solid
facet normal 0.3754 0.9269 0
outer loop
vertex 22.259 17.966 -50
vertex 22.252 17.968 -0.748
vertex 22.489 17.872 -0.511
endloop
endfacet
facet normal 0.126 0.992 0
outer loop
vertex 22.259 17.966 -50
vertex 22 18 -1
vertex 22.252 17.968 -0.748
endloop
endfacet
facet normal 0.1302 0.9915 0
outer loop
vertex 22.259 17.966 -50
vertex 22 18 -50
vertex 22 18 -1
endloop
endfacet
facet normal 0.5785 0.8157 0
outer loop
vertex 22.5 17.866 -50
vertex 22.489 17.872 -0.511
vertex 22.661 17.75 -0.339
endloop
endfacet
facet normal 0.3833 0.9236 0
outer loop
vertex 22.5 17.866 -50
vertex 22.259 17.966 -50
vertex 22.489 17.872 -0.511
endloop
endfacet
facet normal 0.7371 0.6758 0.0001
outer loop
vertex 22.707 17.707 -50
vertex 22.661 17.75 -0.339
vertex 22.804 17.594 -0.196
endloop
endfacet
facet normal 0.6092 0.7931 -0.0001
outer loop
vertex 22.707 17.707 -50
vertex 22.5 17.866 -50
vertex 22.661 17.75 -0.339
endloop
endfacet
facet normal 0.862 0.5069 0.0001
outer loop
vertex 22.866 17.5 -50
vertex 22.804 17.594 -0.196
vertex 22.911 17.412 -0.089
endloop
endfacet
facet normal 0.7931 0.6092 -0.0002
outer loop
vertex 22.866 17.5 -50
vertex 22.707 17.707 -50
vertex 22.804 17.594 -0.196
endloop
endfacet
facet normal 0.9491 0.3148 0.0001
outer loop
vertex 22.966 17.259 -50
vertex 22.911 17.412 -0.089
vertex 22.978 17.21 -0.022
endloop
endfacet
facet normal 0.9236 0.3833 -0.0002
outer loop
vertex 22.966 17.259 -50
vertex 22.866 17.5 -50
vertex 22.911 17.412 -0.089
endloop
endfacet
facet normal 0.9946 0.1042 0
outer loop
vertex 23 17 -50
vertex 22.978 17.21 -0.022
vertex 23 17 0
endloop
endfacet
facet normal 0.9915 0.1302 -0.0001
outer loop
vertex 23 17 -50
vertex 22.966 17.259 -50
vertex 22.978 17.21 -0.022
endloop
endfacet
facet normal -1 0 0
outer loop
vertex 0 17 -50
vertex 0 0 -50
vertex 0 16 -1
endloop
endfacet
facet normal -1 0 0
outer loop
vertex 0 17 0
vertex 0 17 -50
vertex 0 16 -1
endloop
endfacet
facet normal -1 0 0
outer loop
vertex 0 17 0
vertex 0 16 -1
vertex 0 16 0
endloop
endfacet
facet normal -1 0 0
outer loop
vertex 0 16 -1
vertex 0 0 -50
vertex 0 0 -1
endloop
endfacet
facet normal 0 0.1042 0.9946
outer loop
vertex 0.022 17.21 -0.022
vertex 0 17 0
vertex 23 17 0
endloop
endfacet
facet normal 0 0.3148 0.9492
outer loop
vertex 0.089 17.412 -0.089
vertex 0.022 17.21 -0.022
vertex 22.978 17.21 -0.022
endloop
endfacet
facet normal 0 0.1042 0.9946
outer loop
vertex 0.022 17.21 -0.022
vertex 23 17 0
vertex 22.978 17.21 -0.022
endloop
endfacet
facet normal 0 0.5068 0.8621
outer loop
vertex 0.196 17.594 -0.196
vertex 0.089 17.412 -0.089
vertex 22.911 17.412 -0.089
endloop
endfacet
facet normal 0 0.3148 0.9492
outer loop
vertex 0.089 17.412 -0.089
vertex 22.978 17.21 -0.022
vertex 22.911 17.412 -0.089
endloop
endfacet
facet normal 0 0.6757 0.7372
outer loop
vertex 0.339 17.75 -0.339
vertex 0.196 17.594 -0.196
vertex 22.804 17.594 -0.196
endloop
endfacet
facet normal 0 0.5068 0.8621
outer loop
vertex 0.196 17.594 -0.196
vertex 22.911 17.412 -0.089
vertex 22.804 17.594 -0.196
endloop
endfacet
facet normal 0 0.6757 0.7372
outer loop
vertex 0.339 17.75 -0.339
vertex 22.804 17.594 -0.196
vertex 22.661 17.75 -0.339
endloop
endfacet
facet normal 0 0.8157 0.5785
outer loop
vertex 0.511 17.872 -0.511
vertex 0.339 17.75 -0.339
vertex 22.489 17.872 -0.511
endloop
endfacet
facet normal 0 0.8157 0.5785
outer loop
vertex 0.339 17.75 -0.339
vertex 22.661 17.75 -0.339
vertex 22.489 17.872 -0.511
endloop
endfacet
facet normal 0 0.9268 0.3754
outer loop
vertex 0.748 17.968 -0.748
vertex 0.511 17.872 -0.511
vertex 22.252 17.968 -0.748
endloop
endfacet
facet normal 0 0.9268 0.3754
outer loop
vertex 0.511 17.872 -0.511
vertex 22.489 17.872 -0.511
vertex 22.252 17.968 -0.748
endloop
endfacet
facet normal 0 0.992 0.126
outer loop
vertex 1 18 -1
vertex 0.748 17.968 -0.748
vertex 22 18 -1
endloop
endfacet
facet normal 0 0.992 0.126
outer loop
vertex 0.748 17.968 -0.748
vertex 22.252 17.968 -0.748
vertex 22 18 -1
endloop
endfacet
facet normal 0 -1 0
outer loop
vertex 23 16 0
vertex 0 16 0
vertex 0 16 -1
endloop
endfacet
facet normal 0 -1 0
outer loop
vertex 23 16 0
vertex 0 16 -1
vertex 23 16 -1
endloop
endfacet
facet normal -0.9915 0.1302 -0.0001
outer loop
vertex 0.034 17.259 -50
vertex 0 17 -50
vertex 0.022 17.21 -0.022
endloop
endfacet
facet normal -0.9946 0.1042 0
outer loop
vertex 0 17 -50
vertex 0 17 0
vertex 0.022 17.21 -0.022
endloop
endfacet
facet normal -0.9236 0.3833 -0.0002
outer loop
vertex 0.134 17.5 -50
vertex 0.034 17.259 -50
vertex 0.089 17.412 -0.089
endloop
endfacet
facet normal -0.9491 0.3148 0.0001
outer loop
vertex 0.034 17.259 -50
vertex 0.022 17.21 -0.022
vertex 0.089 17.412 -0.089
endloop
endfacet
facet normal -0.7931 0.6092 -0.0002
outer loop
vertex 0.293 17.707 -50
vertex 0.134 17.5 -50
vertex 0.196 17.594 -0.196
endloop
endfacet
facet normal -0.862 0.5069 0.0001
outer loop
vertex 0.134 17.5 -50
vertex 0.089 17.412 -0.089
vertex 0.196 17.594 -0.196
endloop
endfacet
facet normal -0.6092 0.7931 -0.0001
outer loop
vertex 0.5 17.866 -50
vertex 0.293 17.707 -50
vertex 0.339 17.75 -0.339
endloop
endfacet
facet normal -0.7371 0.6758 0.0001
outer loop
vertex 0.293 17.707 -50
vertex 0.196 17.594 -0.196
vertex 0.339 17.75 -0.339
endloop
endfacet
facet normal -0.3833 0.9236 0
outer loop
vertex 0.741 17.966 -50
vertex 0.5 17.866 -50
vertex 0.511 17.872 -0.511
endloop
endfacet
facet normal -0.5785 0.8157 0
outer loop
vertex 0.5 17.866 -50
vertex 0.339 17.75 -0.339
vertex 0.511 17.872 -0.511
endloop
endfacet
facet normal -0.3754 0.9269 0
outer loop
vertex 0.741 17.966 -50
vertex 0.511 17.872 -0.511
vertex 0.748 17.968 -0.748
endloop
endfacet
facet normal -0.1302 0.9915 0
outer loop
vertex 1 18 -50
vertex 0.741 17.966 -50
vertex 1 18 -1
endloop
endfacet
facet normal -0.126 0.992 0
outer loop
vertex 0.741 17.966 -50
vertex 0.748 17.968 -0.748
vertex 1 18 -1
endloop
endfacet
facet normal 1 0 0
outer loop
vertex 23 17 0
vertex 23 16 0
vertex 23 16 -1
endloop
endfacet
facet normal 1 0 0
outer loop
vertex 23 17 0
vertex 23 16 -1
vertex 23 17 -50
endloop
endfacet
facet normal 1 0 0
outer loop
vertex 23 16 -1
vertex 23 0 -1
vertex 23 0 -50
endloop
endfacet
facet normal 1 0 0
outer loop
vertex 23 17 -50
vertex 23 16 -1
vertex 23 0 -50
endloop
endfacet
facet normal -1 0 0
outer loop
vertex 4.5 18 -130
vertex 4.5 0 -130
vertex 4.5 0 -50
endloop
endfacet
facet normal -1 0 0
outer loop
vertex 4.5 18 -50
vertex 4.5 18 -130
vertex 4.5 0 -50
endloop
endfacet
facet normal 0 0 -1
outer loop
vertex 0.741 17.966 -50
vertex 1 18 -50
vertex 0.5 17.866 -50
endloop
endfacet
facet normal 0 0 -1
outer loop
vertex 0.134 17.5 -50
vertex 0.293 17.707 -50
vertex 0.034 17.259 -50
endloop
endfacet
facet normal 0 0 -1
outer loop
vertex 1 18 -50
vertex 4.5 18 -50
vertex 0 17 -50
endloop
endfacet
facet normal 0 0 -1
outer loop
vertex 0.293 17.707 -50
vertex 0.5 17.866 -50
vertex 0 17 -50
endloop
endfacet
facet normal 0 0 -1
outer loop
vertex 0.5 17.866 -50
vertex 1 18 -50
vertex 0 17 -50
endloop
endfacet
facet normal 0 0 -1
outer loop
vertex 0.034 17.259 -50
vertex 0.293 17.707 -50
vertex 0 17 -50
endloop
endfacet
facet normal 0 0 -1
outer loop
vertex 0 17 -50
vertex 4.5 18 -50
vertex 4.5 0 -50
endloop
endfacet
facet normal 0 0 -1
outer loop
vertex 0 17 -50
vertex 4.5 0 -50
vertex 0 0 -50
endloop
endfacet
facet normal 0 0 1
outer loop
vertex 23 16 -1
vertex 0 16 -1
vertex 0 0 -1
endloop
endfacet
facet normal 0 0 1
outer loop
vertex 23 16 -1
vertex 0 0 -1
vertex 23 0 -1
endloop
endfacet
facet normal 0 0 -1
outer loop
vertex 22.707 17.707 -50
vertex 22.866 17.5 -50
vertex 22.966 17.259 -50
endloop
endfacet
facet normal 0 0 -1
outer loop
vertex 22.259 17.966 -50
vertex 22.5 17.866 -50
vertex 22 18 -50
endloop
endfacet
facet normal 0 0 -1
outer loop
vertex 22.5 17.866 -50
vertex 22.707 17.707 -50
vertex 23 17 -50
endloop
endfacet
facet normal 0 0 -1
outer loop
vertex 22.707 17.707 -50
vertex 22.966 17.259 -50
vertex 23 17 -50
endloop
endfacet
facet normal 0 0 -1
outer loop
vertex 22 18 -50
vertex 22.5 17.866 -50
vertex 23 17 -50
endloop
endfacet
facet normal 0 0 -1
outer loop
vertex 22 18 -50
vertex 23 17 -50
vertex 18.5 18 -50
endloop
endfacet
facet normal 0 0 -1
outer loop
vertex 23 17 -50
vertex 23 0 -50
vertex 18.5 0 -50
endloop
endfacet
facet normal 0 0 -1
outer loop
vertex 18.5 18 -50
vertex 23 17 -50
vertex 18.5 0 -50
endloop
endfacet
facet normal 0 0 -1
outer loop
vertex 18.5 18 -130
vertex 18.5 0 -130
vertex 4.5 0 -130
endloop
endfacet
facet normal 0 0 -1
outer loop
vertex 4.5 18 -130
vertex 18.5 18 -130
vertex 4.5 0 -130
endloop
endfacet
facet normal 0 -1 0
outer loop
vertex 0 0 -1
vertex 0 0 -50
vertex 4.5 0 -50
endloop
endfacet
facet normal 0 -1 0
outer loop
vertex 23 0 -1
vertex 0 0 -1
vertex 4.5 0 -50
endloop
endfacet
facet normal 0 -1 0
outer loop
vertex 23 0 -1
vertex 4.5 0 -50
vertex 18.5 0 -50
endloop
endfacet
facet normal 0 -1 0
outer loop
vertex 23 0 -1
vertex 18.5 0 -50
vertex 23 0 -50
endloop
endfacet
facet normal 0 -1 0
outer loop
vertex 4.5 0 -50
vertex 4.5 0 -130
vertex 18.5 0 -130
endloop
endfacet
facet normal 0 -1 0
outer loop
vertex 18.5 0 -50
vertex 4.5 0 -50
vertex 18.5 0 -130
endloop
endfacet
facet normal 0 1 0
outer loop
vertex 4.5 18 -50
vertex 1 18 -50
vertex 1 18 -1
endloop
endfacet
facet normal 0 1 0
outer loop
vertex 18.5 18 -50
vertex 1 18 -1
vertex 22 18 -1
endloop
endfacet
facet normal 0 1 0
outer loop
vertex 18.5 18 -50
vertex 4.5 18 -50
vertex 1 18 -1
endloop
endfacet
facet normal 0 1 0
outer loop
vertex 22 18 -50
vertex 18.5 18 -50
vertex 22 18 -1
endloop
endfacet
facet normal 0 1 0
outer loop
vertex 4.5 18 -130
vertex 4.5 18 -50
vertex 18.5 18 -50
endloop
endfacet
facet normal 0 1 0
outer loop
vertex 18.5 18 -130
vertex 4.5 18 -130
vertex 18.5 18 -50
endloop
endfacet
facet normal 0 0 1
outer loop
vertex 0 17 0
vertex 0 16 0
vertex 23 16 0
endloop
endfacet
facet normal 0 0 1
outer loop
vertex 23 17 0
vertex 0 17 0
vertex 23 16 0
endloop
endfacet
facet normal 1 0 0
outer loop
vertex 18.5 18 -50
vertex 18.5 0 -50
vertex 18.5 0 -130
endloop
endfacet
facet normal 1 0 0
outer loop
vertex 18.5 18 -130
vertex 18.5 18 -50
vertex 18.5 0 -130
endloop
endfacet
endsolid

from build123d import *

# Parameters (mm, degrees)
SALIENTE_EXTRUIR1_DEPTH = 18
CROQUIS3_W              = 23
CROQUIS3_H              = 16
CORTAR_EXTRUIR1_DEPTH   = 1
REDONDEO1_R             = 1


with BuildPart() as part:
    # Croquis2 → Saliente-Extruir1 (new body)
    with BuildSketch(Plane(origin=(0, 0, 0), x_dir=(1, 0, 0), z_dir=(0, 1, 0))):
        Polygon((0, 50), (0, 0), (23, 0), (23, 50), (18.5, 50), (18.5, 130), (4.5, 130), (4.5, 50), align=None)
    extrude(amount=SALIENTE_EXTRUIR1_DEPTH)

    # Croquis3 → Cortar-Extruir1 (cut)
    with BuildSketch(Plane.XY):
        with Locations((11.5, 8)):
            Rectangle(CROQUIS3_W, CROQUIS3_H)
    extrude(amount=-CORTAR_EXTRUIR1_DEPTH, mode=Mode.SUBTRACT)

    # Redondeo1
    redondeo1_edges = [part.edges().sort_by_distance(p)[0] for p in [
        (0, 18, -25),
        (11.5, 18, 0),
        (23, 18, -25),
    ]]
    fillet(redondeo1_edges, radius=REDONDEO1_R)


solid = part.part
